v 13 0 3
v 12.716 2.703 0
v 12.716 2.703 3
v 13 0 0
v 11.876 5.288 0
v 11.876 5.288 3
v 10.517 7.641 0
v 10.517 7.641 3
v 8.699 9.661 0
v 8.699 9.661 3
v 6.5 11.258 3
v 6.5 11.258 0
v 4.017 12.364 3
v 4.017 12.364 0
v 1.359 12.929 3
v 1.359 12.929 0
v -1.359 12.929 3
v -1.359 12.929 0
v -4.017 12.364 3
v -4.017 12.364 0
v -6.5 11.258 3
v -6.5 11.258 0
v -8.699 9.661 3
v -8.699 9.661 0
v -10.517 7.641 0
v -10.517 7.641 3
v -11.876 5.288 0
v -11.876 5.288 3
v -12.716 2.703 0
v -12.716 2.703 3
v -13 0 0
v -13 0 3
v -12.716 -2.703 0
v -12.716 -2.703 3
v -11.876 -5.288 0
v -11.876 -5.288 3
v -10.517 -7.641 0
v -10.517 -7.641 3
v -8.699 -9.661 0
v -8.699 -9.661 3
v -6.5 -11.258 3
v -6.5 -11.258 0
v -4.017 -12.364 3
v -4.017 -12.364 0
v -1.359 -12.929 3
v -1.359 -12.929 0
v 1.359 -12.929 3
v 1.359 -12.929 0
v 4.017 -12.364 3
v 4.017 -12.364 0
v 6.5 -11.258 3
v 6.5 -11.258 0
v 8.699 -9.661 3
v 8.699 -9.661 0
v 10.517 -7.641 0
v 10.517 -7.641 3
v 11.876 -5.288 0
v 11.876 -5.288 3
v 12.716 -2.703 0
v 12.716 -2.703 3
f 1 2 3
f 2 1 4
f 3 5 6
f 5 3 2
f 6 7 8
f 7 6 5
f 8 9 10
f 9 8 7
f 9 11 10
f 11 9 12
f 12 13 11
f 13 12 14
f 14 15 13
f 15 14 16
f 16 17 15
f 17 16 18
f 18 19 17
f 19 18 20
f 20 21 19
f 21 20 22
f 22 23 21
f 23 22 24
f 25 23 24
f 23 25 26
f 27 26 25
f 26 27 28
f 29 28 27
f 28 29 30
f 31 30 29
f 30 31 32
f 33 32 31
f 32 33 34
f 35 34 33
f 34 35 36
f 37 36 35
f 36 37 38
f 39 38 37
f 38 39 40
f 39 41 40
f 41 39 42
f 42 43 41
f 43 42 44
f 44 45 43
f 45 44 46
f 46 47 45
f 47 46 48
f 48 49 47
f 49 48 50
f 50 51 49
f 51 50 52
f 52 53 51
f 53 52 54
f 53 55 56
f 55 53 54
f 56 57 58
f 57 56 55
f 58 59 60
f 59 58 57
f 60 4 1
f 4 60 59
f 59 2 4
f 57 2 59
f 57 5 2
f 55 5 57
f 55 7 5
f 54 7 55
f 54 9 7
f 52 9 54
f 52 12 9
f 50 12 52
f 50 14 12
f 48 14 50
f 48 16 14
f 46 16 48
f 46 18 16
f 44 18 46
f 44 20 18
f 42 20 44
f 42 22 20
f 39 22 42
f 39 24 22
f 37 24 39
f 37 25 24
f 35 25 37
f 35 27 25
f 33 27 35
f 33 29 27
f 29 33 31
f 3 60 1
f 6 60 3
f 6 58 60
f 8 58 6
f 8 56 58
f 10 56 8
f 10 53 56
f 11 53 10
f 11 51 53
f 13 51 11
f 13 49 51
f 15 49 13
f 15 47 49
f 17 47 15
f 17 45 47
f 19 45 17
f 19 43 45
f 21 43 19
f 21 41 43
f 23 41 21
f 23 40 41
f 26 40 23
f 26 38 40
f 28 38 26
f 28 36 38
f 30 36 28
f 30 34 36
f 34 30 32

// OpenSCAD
// Generated by SolidPython 1.0.1 on 2020-07-29 00:46:43


cylinder(h = 3, r1 = 13, r2 = 13);
/***********************************************
*********      SolidPython code:      **********
************************************************
 
# import packages: SolidPython
from solid import *
from solid.utils import *
from itertools import chain, combinations, permutations


class Resize:

    def __init__(self, scad_file):
        self.scad_file = scad_file
        #self.scad_file = import_scad(scad_file)
        # cone/cylinder param:
        self.r1 = 0
        self.r2 = 0
        self.h = 0
        # rectangular prism param:
        self.w = 0
        self.l = 0
        # ellipse param:
        self.r = 0

    # import OpenScad code (file name corresponds to shape)


    # classify shape + parameters
    def assign(self, param1, param2, param3):
        if self.scad_file == 'cone.scad':
            self.r1 = param1
            self.r2 = param2
            self.h = param3
        elif self.scad_file == 'cylinder.scad':
            self.r1 = param1
            self.r2 = param2
            self.h = param3
        elif self.scad_file == 'rectangularPrism.scad':
            self.h = param1
            self.l = param2
            self.w = param3
        else:
            self.r = param1
            self.h = param2

    # resize parameters
    def iterate(self):
        x = range(3, 20, 2)
        i = 1
        if self.scad_file == 'cone.scad':
            tempList = list(permutations(x, 2))
            for temp in tempList:
                param1 = temp[0]
                param2 = temp[1]
                filepath = 'produced_scad_files/' + 'cone' + str(param1) + '_' + str(param2) + '_' + '.scad'
                scad_render_to_file(cylinder(h=param1, r1=param2, r2=0), filepath)

        elif self.scad_file == 'cylinder.scad':
            tempList = list(permutations(x, 3))
            for temp in tempList:
                param1 = temp[0]
                param2 = temp[1]
                filepath = 'produced_scad_files/' + 'cylinder' + str(param1) + '_' + str(param2) + '_' + '.scad'
                scad_render_to_file(cylinder(h=param1, r1=param2, r2=param2), filepath)

        elif self.scad_file == 'rectangularPrism.scad':
            tempList = list(permutations(x, 3))
            for temp in tempList:
                param1 = temp[0]
                param2 = temp[1]
                param3 = temp[2]
                filepath = 'produced_scad_files/' + 'rectangularPrism' + str(param1) + '_' + str(param2) + '_' + str(
                    param3) + '.scad'
                scad_render_to_file(cube(size=(param1, param2, param3)), filepath)

        elif self.scad_file == 'ellipse.scad':
            tempList = list(permutations(x, 4))
            for temp in tempList:
                param1 = temp[0]
                param2 = temp[1]
                param3 = temp[2]
                param4 = temp[3]
                filepath = 'produced_scad_files/' + 'ellipse' + str(param1) + '_' + str(param2) + '_' + str(param3) + '_' + str(param4) + '.scad'
                scad_render_to_file(scale([param1, param2, param3])(sphere(r=param4)), filepath)

    def render_to_scadfile(self):
        scad_render_to_file(scad, 'example.scad') 
 
************************************************/
